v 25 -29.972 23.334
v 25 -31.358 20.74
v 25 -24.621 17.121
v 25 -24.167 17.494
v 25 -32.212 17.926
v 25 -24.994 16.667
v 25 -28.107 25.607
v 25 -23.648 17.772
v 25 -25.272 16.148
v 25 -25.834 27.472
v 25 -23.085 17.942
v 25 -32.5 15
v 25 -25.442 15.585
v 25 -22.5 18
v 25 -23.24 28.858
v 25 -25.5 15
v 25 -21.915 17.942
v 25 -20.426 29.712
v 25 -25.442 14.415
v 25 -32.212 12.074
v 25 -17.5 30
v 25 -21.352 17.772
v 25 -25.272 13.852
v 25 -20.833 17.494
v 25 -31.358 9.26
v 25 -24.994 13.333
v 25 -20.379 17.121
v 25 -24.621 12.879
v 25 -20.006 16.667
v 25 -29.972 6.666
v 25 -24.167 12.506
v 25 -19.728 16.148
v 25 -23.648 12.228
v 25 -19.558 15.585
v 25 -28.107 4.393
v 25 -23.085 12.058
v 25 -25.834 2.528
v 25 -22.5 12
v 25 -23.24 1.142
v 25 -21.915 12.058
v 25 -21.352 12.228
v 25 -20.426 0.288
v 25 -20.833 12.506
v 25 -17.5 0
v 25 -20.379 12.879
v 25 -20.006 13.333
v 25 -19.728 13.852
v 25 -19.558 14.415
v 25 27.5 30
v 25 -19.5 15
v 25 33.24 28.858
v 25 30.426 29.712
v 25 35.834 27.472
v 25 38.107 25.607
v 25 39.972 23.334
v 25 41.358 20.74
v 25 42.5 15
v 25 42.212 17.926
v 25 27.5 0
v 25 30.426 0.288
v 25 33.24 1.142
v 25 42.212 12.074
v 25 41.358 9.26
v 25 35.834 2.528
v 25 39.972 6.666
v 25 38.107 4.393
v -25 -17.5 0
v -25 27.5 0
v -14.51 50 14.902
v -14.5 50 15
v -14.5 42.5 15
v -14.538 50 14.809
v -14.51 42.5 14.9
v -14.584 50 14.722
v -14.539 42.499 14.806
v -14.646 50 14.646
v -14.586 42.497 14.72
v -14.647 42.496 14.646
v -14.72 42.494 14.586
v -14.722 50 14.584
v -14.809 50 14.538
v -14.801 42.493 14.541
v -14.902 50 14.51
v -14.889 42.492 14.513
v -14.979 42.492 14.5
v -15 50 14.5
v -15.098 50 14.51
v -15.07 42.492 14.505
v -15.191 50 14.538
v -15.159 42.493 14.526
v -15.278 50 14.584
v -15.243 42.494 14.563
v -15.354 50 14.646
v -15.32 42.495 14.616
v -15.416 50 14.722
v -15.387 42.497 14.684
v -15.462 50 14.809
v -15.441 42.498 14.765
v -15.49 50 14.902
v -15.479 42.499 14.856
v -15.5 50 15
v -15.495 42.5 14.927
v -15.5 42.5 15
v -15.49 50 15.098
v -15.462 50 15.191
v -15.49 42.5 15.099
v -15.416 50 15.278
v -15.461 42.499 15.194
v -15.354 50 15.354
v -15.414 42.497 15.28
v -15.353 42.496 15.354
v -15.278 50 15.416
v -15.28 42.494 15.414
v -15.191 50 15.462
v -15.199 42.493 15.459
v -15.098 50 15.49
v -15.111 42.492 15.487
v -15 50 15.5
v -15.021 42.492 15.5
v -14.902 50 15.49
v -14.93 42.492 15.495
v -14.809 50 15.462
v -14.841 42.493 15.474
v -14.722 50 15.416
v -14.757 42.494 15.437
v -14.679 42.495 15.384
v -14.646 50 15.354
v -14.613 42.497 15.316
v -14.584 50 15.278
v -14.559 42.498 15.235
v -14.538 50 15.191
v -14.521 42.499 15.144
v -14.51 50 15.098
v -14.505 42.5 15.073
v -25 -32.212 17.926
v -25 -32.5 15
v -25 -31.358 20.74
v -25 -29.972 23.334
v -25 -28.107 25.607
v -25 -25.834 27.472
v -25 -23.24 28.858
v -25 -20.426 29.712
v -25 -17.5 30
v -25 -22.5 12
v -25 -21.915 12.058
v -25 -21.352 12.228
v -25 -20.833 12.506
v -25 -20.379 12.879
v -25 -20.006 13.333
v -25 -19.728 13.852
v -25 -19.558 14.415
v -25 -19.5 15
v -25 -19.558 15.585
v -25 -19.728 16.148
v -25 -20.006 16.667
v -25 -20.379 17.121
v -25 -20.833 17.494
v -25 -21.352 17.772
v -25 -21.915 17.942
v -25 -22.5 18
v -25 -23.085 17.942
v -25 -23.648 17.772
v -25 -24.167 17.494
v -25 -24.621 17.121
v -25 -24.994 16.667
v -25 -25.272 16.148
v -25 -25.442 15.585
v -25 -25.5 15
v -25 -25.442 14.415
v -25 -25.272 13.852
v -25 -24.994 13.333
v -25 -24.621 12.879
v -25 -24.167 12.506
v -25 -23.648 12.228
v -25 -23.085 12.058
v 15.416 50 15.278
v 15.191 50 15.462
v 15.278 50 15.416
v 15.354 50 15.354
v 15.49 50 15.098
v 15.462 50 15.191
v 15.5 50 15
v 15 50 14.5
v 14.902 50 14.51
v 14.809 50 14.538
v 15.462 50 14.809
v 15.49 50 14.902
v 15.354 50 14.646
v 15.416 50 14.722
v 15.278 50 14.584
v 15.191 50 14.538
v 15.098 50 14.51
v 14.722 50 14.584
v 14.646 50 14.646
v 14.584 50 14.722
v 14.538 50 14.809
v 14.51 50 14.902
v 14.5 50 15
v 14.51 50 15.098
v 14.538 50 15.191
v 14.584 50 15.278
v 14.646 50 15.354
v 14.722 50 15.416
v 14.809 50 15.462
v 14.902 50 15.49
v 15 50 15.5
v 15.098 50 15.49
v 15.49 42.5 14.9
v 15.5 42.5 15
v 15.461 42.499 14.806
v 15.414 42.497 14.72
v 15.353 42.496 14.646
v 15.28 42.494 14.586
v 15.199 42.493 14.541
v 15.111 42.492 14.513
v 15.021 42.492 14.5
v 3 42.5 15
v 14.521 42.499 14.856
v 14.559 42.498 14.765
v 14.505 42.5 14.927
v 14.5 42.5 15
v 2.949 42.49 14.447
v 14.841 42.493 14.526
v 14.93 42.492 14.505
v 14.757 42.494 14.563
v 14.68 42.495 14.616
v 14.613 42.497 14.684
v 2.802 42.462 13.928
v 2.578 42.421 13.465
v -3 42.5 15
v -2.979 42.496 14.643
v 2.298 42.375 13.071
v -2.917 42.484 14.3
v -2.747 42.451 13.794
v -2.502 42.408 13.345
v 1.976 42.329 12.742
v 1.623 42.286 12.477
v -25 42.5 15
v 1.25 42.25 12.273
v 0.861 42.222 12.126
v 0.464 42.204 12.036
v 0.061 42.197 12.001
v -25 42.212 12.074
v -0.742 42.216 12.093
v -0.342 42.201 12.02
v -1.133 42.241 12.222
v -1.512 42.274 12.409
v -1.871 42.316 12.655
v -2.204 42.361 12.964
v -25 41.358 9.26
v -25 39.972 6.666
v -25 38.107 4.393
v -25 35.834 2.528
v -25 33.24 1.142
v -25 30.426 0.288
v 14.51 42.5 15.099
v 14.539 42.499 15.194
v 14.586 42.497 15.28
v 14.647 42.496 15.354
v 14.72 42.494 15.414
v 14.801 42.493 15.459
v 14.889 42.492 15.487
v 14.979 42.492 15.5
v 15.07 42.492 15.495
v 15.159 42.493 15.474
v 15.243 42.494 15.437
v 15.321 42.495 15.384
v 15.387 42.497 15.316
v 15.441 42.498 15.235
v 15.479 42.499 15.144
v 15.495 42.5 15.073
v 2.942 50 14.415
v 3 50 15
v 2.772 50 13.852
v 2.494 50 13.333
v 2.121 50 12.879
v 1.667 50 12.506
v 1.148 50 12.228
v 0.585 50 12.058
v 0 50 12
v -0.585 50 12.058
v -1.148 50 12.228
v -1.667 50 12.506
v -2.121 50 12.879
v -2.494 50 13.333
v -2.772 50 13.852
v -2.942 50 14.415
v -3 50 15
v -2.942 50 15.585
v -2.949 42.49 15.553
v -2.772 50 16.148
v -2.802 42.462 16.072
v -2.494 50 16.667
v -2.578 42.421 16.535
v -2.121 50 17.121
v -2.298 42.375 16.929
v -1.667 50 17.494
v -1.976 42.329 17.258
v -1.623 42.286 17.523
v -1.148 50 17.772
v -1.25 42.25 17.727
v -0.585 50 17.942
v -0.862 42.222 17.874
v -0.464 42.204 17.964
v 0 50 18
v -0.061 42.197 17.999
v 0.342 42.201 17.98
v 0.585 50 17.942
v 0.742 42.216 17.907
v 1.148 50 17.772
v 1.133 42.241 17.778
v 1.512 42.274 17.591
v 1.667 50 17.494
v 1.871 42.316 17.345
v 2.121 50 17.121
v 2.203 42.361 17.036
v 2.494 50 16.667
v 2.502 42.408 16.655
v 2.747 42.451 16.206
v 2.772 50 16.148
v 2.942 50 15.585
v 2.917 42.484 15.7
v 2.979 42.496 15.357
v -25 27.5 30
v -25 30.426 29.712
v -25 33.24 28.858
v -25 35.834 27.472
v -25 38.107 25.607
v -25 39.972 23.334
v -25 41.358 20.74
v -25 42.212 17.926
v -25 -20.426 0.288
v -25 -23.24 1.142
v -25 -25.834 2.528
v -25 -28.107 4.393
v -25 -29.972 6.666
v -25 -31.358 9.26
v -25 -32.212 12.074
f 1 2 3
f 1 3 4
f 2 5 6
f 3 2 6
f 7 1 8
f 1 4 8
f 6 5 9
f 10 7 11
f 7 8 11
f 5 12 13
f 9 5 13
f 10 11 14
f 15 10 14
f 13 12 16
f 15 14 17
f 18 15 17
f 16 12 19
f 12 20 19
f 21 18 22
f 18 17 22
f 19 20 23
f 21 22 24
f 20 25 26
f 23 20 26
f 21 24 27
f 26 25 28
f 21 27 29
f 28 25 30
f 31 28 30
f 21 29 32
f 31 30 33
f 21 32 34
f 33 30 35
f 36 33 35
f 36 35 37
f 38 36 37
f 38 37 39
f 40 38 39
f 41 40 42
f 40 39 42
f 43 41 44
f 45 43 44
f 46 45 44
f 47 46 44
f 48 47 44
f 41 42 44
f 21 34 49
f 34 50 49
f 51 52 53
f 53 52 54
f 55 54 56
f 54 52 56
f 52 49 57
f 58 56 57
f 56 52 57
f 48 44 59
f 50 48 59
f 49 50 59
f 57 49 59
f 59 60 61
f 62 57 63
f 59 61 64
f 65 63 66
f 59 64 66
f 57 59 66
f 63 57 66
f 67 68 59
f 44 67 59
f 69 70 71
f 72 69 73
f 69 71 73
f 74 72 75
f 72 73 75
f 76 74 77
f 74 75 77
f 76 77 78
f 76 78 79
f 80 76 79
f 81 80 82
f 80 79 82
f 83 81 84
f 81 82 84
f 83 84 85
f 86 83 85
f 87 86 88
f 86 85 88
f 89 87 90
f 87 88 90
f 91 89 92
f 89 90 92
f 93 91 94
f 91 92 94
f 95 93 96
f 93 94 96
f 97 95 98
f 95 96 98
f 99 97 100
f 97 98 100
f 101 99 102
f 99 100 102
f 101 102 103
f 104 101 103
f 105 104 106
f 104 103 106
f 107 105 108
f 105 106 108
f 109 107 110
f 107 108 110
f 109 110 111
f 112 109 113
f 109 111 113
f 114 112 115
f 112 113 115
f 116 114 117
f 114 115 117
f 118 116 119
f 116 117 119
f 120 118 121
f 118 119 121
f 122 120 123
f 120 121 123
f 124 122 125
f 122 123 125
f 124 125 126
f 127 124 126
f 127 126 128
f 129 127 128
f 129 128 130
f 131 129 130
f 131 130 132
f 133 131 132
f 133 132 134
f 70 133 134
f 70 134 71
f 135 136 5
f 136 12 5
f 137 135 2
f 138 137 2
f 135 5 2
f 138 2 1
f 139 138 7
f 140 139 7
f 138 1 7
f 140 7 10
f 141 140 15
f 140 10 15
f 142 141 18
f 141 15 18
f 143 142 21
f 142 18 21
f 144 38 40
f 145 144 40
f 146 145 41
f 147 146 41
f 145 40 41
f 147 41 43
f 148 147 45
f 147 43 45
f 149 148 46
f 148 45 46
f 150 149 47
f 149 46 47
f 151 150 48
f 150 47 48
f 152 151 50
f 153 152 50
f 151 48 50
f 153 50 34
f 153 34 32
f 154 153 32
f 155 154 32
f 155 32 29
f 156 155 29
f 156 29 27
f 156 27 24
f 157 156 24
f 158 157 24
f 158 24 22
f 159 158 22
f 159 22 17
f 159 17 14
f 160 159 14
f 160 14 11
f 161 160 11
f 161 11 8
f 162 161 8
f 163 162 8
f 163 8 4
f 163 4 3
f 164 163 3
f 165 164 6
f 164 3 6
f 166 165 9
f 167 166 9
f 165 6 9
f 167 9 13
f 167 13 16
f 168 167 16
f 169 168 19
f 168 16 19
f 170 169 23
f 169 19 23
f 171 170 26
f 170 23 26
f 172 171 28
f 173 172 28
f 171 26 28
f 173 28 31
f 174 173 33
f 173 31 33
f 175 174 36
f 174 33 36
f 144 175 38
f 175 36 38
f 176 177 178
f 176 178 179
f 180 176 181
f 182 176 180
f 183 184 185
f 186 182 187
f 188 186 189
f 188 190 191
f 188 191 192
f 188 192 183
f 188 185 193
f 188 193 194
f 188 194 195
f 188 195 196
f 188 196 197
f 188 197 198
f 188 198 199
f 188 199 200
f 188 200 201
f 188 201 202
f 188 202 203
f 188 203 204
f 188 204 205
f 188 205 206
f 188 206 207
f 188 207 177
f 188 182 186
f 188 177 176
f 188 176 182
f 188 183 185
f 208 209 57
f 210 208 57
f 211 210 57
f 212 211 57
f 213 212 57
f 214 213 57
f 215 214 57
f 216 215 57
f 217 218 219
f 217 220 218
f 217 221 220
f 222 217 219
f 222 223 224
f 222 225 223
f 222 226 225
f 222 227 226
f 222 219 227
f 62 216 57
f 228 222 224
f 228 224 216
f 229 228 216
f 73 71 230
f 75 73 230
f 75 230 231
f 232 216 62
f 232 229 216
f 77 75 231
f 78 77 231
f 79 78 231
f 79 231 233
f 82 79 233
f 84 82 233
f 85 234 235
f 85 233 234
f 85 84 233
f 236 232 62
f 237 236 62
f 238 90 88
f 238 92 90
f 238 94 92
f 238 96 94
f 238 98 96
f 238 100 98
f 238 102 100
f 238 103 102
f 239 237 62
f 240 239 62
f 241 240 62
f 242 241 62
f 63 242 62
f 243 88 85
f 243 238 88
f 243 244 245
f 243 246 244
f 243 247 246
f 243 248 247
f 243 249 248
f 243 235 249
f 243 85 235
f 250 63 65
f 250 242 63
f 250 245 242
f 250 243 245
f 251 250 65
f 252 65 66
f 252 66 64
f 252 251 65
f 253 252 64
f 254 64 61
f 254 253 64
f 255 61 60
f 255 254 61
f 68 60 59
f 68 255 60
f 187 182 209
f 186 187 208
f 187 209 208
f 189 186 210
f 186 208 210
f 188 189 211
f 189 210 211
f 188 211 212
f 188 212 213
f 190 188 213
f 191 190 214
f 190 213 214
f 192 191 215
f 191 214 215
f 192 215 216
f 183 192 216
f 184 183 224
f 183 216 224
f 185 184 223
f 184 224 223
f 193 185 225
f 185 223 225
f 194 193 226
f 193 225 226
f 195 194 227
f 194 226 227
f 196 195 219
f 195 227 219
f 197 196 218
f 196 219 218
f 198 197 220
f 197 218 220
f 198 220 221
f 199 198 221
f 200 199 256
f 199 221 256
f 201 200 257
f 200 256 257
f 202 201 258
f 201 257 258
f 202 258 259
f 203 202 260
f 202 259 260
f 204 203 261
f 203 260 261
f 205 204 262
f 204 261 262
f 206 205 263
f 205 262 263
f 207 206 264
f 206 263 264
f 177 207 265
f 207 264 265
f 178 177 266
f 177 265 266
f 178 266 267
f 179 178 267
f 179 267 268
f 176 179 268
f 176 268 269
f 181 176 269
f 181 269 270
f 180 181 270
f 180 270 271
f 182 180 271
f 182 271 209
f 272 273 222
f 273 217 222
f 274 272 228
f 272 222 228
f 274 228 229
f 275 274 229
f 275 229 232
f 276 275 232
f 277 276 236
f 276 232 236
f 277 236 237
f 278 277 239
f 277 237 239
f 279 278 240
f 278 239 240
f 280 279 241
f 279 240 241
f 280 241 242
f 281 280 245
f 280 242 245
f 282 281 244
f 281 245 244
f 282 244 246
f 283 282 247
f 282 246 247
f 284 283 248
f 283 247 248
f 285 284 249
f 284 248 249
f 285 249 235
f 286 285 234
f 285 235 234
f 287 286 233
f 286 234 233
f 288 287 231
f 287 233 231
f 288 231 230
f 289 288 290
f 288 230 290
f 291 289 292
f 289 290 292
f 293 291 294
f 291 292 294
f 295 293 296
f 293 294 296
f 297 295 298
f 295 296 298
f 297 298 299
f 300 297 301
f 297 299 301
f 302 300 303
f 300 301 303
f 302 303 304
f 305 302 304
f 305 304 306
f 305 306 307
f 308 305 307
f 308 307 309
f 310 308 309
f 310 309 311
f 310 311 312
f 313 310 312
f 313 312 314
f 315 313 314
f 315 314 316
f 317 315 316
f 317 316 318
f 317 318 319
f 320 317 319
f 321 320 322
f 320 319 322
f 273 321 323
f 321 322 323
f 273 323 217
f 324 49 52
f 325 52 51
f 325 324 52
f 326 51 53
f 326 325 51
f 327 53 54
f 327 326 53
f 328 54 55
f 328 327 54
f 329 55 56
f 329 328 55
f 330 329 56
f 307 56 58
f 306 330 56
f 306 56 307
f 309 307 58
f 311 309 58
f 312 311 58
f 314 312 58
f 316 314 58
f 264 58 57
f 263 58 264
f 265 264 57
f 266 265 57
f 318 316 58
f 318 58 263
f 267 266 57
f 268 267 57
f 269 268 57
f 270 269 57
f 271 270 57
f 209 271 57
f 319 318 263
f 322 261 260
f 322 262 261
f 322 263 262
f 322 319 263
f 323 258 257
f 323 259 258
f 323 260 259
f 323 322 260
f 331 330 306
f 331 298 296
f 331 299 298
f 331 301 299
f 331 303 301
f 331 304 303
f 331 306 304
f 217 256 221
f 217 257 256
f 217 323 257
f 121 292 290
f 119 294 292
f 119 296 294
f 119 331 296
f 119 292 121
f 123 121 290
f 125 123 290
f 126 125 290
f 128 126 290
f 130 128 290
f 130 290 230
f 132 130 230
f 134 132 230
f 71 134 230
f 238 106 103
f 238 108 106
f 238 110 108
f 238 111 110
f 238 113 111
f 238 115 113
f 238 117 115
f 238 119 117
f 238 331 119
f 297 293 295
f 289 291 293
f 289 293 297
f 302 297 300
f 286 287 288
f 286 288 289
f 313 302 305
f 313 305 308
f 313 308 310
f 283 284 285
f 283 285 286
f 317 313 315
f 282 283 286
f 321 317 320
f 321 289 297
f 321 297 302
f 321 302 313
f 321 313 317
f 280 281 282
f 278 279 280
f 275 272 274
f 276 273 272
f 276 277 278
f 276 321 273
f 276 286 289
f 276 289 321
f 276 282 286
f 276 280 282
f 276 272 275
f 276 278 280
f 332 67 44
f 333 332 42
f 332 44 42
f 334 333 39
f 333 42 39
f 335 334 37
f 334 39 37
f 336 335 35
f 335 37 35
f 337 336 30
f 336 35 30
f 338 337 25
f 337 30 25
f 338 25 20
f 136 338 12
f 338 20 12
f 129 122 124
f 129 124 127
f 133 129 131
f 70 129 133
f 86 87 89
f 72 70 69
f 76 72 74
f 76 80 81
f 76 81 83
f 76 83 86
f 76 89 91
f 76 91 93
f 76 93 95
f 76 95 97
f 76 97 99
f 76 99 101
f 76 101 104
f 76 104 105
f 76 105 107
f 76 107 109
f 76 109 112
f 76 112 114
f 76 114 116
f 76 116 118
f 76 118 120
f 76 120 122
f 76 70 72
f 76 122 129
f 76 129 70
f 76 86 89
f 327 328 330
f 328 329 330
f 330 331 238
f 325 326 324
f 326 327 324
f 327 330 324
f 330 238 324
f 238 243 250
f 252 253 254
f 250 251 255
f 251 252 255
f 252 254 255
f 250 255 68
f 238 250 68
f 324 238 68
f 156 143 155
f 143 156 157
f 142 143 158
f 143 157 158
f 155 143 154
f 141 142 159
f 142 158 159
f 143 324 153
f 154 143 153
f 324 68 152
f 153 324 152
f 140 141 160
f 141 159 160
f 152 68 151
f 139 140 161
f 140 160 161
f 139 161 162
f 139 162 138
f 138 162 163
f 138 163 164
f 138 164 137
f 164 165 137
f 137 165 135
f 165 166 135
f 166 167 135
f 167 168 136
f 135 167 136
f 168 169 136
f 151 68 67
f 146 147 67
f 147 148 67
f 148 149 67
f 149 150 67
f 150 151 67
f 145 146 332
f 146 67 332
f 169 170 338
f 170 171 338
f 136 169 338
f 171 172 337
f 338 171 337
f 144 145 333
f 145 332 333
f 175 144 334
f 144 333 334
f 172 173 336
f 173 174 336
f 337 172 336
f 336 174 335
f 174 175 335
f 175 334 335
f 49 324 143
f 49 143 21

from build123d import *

# Parameters (mm, degrees)
EXTRUDE_1_DEPTH     = 30
SKETCH_2_R          = 3
CUT_EXTRUDE_1_DEPTH = 52
FILLET_1_R          = 15
FILLET_2_R          = 15
FILLET_3_R          = 15
FILLET_4_R          = 15
SKETCH_4_R          = 3
SKETCH_4_R_2        = 0.5
EXTRUDE_2_DEPTH     = 50


with BuildPart() as part:
    # 草图1 → 凸台-拉伸1 (new body)
    with BuildSketch(Plane.XY):
        Polygon((25, 0), (25, 42.5), (-25, 42.5), (-25, -32.5), (25, -32.5), align=None)
    extrude(amount=EXTRUDE_1_DEPTH)

    # 草图2 → 切除-拉伸1 (cut)
    with BuildSketch(Plane(origin=(25, 0, 0), x_dir=(0, 0, -1), z_dir=(1, 0, 0))):
        with Locations((-15, -22.5)):
            Circle(SKETCH_2_R)
    extrude(amount=-CUT_EXTRUDE_1_DEPTH, mode=Mode.SUBTRACT)

    # 圆角1
    fillet_1_edges = [part.edges().sort_by_distance(p)[0] for p in [
        (0, -32.5, 0),
    ]]
    fillet(fillet_1_edges, radius=FILLET_1_R)

    # 圆角2
    fillet_2_edges = [part.edges().sort_by_distance(p)[0] for p in [
        (0, -32.5, 30),
    ]]
    fillet(fillet_2_edges, radius=FILLET_2_R - 0.0001)  # a hair under: the kernel refuses the full size

    # 圆角3
    fillet_3_edges = [part.edges().sort_by_distance(p)[0] for p in [
        (0, 42.5, 30),
    ]]
    fillet(fillet_3_edges, radius=FILLET_3_R)

    # 圆角4
    fillet_4_edges = [part.edges().sort_by_distance(p)[0] for p in [
        (0, 42.5, 0),
    ]]
    fillet(fillet_4_edges, radius=FILLET_4_R - 0.0001)  # a hair under: the kernel refuses the full size

    # 草图4 → 凸台-拉伸2 (add)
    with BuildSketch(Plane(origin=(0, 0, 0), x_dir=(1, 0, 0), z_dir=(0, 1, 0))):
        with Locations((0, -15)):
            Circle(SKETCH_4_R)
        with Locations((15, -15)):
            Circle(SKETCH_4_R_2)
        with Locations((-15, -15)):
            Circle(SKETCH_4_R_2)
    extrude(amount=EXTRUDE_2_DEPTH)


solid = part.part
